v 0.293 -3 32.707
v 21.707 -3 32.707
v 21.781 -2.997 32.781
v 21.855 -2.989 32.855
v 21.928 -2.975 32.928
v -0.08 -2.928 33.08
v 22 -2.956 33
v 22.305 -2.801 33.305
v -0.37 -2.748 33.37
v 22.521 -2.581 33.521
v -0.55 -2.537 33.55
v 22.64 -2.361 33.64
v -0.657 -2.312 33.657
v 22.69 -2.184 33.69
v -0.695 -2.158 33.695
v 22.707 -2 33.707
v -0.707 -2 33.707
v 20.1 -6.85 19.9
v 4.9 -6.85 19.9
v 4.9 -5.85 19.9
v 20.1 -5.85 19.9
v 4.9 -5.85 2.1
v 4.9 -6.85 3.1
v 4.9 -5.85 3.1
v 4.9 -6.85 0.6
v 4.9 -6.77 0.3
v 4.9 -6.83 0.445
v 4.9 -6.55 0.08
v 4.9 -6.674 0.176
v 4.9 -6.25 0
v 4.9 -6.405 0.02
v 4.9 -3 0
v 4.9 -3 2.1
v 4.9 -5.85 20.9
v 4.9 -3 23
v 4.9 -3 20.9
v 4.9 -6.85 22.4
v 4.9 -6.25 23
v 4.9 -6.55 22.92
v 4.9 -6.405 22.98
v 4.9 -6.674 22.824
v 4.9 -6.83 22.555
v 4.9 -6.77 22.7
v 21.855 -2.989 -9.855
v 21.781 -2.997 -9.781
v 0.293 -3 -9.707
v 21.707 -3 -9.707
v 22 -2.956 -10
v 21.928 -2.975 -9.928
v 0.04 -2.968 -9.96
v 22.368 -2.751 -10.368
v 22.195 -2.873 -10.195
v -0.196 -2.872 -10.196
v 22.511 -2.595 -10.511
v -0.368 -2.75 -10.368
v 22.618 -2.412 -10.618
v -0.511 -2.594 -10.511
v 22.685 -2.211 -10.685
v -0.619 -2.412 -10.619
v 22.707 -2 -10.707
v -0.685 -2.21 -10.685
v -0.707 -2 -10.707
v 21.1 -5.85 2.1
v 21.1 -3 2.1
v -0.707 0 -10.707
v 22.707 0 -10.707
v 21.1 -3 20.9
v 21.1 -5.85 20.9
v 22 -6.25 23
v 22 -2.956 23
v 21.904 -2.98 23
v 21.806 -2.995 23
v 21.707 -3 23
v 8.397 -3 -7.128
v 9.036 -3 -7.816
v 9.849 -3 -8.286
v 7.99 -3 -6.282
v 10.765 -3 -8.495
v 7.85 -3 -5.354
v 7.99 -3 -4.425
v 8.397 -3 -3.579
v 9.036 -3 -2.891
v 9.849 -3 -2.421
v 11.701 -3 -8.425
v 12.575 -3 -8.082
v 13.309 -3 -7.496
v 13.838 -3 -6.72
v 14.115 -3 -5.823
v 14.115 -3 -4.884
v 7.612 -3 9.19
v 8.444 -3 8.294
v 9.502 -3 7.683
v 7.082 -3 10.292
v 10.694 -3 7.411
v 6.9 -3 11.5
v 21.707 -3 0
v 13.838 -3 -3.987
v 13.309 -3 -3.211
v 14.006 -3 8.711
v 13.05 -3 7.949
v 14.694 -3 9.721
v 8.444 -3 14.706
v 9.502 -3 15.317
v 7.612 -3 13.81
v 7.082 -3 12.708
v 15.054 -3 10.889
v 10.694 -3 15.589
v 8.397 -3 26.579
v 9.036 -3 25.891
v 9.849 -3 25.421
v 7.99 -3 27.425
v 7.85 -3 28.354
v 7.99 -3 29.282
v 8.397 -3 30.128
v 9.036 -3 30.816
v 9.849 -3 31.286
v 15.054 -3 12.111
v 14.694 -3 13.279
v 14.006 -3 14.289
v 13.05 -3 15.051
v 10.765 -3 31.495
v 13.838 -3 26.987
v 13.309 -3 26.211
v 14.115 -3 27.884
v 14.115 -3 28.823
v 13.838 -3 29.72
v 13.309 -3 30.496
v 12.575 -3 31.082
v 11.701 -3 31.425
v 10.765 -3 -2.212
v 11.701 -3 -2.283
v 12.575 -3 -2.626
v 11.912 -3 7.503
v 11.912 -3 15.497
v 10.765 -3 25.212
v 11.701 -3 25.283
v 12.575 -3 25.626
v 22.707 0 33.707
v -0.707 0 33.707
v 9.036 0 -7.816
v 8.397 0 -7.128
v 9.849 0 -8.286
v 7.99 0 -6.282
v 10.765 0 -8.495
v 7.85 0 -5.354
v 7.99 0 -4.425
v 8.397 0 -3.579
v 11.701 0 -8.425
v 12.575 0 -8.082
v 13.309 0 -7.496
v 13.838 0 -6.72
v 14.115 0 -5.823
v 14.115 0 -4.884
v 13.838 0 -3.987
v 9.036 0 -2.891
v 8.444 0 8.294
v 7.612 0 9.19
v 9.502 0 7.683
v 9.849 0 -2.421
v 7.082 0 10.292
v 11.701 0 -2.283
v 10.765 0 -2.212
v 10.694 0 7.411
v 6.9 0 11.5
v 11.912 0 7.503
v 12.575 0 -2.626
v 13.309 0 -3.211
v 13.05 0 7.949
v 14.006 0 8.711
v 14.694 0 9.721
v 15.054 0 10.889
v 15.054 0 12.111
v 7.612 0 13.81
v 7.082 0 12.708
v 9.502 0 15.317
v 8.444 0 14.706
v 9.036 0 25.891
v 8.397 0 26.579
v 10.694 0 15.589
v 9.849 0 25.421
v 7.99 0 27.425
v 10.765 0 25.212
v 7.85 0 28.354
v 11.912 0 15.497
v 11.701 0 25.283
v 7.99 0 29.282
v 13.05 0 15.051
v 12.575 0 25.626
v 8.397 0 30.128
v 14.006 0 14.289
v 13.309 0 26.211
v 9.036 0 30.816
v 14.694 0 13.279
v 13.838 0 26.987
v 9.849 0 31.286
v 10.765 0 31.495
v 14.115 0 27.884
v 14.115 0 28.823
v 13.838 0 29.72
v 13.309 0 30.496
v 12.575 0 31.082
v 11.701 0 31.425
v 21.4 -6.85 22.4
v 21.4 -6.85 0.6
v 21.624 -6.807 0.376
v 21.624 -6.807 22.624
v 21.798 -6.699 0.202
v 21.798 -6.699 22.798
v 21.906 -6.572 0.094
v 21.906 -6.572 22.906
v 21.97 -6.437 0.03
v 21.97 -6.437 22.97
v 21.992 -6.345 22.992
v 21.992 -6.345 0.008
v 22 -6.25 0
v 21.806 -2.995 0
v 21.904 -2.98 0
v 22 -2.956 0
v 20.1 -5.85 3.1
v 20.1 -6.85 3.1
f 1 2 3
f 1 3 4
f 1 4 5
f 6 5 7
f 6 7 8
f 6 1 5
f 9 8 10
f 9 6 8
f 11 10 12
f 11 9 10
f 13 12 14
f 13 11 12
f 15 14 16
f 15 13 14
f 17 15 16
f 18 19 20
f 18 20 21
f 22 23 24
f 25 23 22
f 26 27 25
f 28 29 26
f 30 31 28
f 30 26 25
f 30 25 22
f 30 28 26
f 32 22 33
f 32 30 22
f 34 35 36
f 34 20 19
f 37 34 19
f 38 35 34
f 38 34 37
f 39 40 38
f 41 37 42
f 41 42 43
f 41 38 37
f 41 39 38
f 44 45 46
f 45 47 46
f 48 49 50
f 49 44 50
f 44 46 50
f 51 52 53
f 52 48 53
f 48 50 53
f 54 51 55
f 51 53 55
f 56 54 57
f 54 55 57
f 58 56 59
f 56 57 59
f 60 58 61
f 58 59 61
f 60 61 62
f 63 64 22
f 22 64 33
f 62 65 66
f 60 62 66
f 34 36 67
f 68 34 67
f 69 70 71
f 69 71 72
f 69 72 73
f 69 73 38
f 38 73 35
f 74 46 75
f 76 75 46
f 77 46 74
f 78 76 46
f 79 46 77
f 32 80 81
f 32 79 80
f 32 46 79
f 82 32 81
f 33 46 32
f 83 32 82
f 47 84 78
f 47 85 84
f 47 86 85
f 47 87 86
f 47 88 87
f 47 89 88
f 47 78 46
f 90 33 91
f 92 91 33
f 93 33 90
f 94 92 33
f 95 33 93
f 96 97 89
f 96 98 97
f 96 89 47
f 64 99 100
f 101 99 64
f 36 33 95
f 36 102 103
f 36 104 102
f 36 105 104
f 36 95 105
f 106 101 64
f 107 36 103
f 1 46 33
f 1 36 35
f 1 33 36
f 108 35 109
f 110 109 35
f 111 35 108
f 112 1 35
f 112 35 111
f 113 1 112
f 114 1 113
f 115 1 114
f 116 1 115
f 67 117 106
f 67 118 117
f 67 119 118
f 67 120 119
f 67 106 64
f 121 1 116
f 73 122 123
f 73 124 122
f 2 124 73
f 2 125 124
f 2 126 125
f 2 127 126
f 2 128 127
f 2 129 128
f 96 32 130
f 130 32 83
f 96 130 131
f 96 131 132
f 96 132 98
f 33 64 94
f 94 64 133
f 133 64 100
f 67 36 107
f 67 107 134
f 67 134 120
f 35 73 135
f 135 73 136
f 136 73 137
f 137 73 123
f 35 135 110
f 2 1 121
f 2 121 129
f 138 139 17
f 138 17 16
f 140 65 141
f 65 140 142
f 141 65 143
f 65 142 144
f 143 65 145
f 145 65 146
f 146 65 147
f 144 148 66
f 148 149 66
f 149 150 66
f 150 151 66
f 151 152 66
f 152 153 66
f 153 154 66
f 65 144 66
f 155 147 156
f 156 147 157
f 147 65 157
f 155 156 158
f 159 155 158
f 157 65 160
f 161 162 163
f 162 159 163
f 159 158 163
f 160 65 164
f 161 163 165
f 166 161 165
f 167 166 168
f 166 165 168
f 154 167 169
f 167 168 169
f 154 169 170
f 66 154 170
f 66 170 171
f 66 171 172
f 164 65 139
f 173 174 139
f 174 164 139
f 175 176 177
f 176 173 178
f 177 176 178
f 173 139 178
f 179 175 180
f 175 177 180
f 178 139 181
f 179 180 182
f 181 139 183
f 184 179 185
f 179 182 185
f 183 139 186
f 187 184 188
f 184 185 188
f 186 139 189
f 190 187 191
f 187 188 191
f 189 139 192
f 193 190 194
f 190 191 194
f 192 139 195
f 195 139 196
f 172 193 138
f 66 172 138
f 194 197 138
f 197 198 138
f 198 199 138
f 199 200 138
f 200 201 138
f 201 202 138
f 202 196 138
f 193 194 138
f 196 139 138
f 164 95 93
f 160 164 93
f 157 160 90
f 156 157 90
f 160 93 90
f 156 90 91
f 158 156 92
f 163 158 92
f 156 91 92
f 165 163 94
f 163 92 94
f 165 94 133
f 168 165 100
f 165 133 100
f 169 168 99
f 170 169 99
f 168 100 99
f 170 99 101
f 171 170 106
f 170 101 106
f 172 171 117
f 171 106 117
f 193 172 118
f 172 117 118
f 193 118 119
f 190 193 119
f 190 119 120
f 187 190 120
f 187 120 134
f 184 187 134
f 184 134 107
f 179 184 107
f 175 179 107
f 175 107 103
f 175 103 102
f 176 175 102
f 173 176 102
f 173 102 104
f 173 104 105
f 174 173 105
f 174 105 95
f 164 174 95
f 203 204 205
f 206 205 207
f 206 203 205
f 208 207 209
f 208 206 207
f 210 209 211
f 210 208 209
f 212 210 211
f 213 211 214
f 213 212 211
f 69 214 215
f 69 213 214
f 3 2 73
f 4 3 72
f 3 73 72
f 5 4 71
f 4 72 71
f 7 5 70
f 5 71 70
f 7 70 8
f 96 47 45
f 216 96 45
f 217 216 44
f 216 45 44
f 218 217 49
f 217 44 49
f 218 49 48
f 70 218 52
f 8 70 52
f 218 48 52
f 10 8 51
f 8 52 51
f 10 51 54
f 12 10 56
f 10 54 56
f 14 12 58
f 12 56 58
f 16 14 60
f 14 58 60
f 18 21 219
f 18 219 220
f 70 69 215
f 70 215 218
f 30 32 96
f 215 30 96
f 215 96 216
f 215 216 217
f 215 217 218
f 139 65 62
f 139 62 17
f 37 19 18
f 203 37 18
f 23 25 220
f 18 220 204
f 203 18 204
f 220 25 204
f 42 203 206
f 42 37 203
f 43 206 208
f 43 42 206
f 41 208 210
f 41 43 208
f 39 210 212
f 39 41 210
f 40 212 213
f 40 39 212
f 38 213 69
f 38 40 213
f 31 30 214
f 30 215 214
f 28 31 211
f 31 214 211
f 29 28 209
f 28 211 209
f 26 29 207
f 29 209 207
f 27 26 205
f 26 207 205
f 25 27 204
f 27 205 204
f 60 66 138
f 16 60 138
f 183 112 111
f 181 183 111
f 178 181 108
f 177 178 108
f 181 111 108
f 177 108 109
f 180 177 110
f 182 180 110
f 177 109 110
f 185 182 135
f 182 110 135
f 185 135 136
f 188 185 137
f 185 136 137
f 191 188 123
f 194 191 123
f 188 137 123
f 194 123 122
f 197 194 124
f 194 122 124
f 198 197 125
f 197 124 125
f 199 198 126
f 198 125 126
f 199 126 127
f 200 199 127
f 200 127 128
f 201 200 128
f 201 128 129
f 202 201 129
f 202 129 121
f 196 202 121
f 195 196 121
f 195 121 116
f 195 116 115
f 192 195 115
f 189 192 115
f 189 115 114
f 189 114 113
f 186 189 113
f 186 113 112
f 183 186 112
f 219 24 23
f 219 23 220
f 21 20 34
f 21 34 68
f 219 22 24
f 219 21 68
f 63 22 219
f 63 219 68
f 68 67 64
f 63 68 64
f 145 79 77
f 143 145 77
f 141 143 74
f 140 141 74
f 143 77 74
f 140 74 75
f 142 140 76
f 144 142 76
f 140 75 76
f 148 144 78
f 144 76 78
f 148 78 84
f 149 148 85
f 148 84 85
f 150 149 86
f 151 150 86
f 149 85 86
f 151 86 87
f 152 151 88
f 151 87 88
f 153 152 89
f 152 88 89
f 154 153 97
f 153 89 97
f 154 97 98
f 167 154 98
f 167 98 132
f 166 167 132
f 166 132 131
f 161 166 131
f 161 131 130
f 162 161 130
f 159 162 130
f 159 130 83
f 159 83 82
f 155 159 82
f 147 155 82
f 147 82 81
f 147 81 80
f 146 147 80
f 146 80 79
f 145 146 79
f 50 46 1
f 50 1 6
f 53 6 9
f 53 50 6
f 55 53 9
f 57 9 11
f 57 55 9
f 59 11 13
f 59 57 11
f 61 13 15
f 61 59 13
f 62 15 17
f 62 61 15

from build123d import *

# Parameters (mm, degrees)
F1_DEPTH      = 3
F2_DEPTH      = 6.85
F6_DEPTH      = 3
F3_W          = 16.2
F3_H          = 1
F7_DEPTH      = 1
F5_W          = 16.2
F5_H          = 1
F8_DEPTH      = 1
F4_W          = 1
F4_H          = 18.8
F9_DEPTH      = 1
F10_D         = 8.2
F0_W          = 23.4142135624
F0_H          = 44.4142135624
F11_DEPTH     = 3
F12_T1_DEPTH  = 28.4142135624
F12_T3_DEPTH  = 49.4142135624
F12_T8_DEPTH  = 49.4142135624
F12_T14_DEPTH = 49.4142135624
F12_T20_DEPTH = 49.4142135624
F12_T27_DEPTH = 49.4142135624
F12_T33_DEPTH = 49.4142135624
F13_R         = 0.6
F14_D         = 6.3


# Not quite as in the source:
# - a fillet or chamfer that OpenCascade refuses, or shapes differently, is made with other operations: its cross-section is extruded or revolved along the edge and cut away or added
# - a feature names something its author has since deleted; it is built from what else it names


with BuildPart() as f1:
    # F0 (on Front) → F1 (new body)
    with BuildSketch(Plane.XZ):
        Polygon((0.9, 2.1), (4.9, 2.1), (21.1, 2.1), (21.1, 20.9), (4.9, 20.9), (0.9, 20.9), align=None)
        Polygon((0, 23), (0, 0), (4.9, 0), (4.9, 2.1), (0.9, 2.1), (0.9, 20.9), (4.9, 20.9), (4.9, 23), align=None)
        Polygon((4.9, 2.1), (4.9, 0), (22, 0), (22, 23), (4.9, 23), (4.9, 20.9), (21.1, 20.9), (21.1, 2.1), align=None)
    extrude(amount=F1_DEPTH)

    # F0 (on Front) → F2 (join)
    with BuildSketch(Plane.XZ):
        Polygon((4.9, 2.1), (4.9, 0), (22, 0), (22, 23), (4.9, 23), (4.9, 20.9), (21.1, 20.9), (21.1, 2.1), align=None)
    extrude(amount=F2_DEPTH)

    # F0 (on Front) → F6 (join)
    with BuildSketch(Plane.XZ):
        Polygon((0, 23), (0, 0), (4.9, 0), (4.9, 2.1), (0.9, 2.1), (0.9, 20.9), (4.9, 20.9), (4.9, 23), align=None)
    extrude(amount=F6_DEPTH)

    # F3 (on face) → F7 (join)
    with BuildSketch(Plane(origin=(0, 0, 20.9), x_dir=(1, 0, 0), z_dir=(0, 0, -1))):
        with Locations((13, 6.35)):
            Rectangle(F3_W, F3_H)
    extrude(amount=F7_DEPTH)

    # F5 (on face) → F8 (join)
    with BuildSketch(Plane.XY.offset(2.1)):
        with Locations((13, -6.35)):
            Rectangle(F5_W, F5_H)
    extrude(amount=F8_DEPTH)

    # F4 (on face) → F9 (join)
    with BuildSketch(Plane(origin=(21.1, 0, 0), x_dir=(0, -1, 0), z_dir=(-1, 0, 0))):
        with Locations((6.35, 11.5)):
            Rectangle(F4_W, F4_H)
    extrude(amount=F9_DEPTH)

    # F10 (through all)
    with Locations(Plane(origin=(0, 0, 0), x_dir=(1, 0, 0), z_dir=(0, 1, 0))):
        with Locations((11, -11.5)):
            Hole(F10_D / 2)

    # F0 (on Front) → F11 (join)
    with BuildSketch(Plane.XZ):
        with Locations((11, 11.5)):
            Rectangle(F0_W, F0_H)
        Polygon((4.9, 0), (0, 0), (0, 23), (4.9, 23), (22, 23), (22, 0), align=None, mode=Mode.SUBTRACT)
    extrude(amount=F11_DEPTH)

    # F12: fillet of radius 1 on 4 edges, made by hand

    # F12_s2 → F12_t1 (cut)
    with BuildSketch(Plane.YZ.offset(-3.2071067812)):
        with BuildLine():
            ThreePointArc((-3, -9.7071067812), (-2.7071067812, -10.4142135624), (-2, -10.7071067812))
            Line((-2, -10.7071067812), (-3, -10.7071067812))
            Line((-3, -10.7071067812), (-3, -9.7071067812))
        make_face()
        with BuildLine():
            ThreePointArc((-3, 32.7071067812), (-2.7071067812, 33.4142135624), (-2, 33.7071067812))
            Line((-2, 33.7071067812), (-3, 33.7071067812))
            Line((-3, 33.7071067812), (-3, 32.7071067812))
        make_face()
    extrude(amount=F12_T1_DEPTH, mode=Mode.SUBTRACT)

    # F12_s4 → F12_t3 (cut)
    with BuildSketch(Plane.XY.offset(-13.2071067812)):
        with BuildLine():
            ThreePointArc((0.2928932188, -3), (-0.4142135624, -2.7071067812), (-0.7071067812, -2))
            Line((-0.7071067812, -2), (-0.7071067812, -3))
            Line((-0.7071067812, -3), (0.2928932188, -3))
        make_face()
    extrude(amount=F12_T3_DEPTH, mode=Mode.SUBTRACT)


with BuildPart() as f12_tool6:
    # F12_s7 → F12_t8 (new body)
    with BuildSketch(Plane.XY.offset(-13.2071067812)):
        with BuildLine():
            ThreePointArc((21.7071067812, -3), (22.4142135624, -2.7071067812), (22.7071067812, -2))
            Line((22.7071067812, -2), (22.7071067812, -3))
            Line((22.7071067812, -3), (21.7071067812, -3))
        make_face()
    extrude(amount=F12_T8_DEPTH)

    split(bisect_by=Plane.XY, keep=Keep.BOTTOM)

    split(bisect_by=Plane.YZ.offset(22), keep=Keep.BOTTOM)


with BuildPart() as f1_1:
    add(f1.part)

    # F12_t5: cut F12_tool6
    add(f12_tool6.part, mode=Mode.SUBTRACT)


with BuildPart() as f12_tool12:
    # F12_s13 → F12_t14 (new body)
    with BuildSketch(Plane.XY.offset(-13.2071067812)):
        with BuildLine():
            ThreePointArc((21.7071067812, -3), (22.4142135624, -2.7071067812), (22.7071067812, -2))
            Line((22.7071067812, -2), (22.7071067812, -3))
            Line((22.7071067812, -3), (21.7071067812, -3))
        make_face()
    extrude(amount=F12_T14_DEPTH)

    split(bisect_by=Plane.XY, keep=Keep.BOTTOM)

    split(bisect_by=Plane.YZ.offset(22), keep=Keep.TOP)


with BuildPart() as f1_2:
    add(f1_1.part)

    # F12_t11: cut F12_tool12
    add(f12_tool12.part, mode=Mode.SUBTRACT)


with BuildPart() as f12_tool18:
    # F12_s19 → F12_t20 (new body)
    with BuildSketch(Plane.XY.offset(-13.2071067812)):
        with BuildLine():
            ThreePointArc((21.7071067812, -3), (22.4142135624, -2.7071067812), (22.7071067812, -2))
            Line((22.7071067812, -2), (22.7071067812, -3))
            Line((22.7071067812, -3), (21.7071067812, -3))
        make_face()
    extrude(amount=F12_T20_DEPTH)

    split(bisect_by=Plane.XY.offset(23), keep=Keep.BOTTOM)

    split(bisect_by=Plane.XY, keep=Keep.TOP)

    split(bisect_by=Plane.YZ.offset(22), keep=Keep.TOP)


with BuildPart() as f1_3:
    add(f1_2.part)

    # F12_t17: cut F12_tool18
    add(f12_tool18.part, mode=Mode.SUBTRACT)


with BuildPart() as f12_tool25:
    # F12_s26 → F12_t27 (new body)
    with BuildSketch(Plane.XY.offset(-13.2071067812)):
        with BuildLine():
            ThreePointArc((21.7071067812, -3), (22.4142135624, -2.7071067812), (22.7071067812, -2))
            Line((22.7071067812, -2), (22.7071067812, -3))
            Line((22.7071067812, -3), (21.7071067812, -3))
        make_face()
    extrude(amount=F12_T27_DEPTH)

    split(bisect_by=Plane.XY.offset(23), keep=Keep.TOP)

    split(bisect_by=Plane.YZ.offset(22), keep=Keep.BOTTOM)


with BuildPart() as f1_4:
    add(f1_3.part)

    # F12_t24: cut F12_tool25
    add(f12_tool25.part, mode=Mode.SUBTRACT)


with BuildPart() as f12_tool31:
    # F12_s32 → F12_t33 (new body)
    with BuildSketch(Plane.XY.offset(-13.2071067812)):
        with BuildLine():
            ThreePointArc((21.7071067812, -3), (22.4142135624, -2.7071067812), (22.7071067812, -2))
            Line((22.7071067812, -2), (22.7071067812, -3))
            Line((22.7071067812, -3), (21.7071067812, -3))
        make_face()
    extrude(amount=F12_T33_DEPTH)

    split(bisect_by=Plane.XY.offset(23), keep=Keep.TOP)

    split(bisect_by=Plane.YZ.offset(22), keep=Keep.TOP)


with BuildPart() as f1_5:
    add(f1_4.part)

    # F12_t30: cut F12_tool31
    add(f12_tool31.part, mode=Mode.SUBTRACT)

    # F13
    f13_edges = [f1_5.edges().sort_by_distance(p)[0] for p in [
        (22, -6.85, 11.5),
        (13.45, -6.85, 0),
        (13.45, -6.85, 23),
    ]]
    fillet(f13_edges, radius=F13_R)

    # F14 (through all)
    with Locations(Plane(origin=(0, 0, 0), x_dir=(1, 0, 0), z_dir=(0, 1, 0))):
        with Locations((11, -28.3535533906), (11, 5.3535533906)):
            Hole(F14_D / 2)


solid = f1_5.part
